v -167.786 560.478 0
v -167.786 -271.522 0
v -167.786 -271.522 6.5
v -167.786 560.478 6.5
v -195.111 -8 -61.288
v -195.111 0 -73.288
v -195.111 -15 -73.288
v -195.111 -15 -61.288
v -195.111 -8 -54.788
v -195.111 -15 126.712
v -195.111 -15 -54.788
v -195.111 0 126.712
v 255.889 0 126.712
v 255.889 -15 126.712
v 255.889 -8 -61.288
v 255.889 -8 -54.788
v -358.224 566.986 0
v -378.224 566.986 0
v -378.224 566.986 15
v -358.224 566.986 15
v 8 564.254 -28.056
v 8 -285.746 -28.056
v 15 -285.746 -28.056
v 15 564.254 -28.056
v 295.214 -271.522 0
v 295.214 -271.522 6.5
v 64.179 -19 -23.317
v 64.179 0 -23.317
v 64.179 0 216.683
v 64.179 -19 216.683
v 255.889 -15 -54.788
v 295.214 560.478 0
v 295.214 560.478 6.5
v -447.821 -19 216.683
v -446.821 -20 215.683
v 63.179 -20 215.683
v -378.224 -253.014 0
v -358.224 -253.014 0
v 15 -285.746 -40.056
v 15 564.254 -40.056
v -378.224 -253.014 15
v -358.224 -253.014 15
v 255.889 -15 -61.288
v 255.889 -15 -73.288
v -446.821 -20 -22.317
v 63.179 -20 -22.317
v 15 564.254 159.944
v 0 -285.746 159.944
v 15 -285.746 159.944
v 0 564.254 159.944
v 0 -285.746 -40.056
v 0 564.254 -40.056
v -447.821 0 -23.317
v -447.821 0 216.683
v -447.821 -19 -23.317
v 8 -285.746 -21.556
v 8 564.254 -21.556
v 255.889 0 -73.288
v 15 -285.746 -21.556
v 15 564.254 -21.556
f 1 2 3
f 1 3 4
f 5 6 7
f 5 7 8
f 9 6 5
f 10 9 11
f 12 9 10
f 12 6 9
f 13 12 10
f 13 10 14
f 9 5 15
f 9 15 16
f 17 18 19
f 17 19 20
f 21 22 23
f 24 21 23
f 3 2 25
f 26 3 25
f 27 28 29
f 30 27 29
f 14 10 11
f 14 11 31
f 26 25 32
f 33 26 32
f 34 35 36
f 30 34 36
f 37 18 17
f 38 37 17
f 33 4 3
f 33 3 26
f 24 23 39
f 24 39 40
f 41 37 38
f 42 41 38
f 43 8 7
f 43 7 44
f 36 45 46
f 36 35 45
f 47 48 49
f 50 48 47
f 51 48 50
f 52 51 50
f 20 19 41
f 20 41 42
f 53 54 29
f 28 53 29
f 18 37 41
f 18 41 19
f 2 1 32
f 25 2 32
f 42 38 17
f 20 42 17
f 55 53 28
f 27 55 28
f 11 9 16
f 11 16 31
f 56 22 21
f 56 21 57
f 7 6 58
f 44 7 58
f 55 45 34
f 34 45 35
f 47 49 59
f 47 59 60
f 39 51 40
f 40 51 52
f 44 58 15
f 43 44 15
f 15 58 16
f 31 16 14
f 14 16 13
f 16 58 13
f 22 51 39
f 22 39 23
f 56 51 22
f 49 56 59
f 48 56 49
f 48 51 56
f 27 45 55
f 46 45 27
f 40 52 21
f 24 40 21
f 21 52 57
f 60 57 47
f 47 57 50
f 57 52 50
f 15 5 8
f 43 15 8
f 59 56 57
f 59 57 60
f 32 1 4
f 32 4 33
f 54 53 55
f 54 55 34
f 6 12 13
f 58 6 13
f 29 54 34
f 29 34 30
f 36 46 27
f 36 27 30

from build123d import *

# Parameters (mm, degrees)
F0_W      = 512
F0_H      = 240
F1_DEPTH  = 20
F2_SIZE   = 1
F3_W      = 850
F3_H      = 200
F4_DEPTH  = 15
F5_W      = 15
F5_H      = 6.5
F6_DEPTH  = 1000
F7_W      = 451
F7_H      = 200
F8_DEPTH  = 15
F9_W      = 17.3011739743
F9_H      = 6.5
F10_DEPTH = 1000
F11_W     = 463
F11_H     = 832
F12_DEPTH = 6.5
F13_W     = 20
F13_H     = 820
F14_DEPTH = 15


with BuildPart() as f1:
    # F0 (on Front) → F1 (new body)
    with BuildSketch(Plane.XZ):
        with Locations((-191.8205638528, 96.6834676266)):
            Rectangle(F0_W, F0_H)
    extrude(amount=F1_DEPTH)

    # F2
    f2_edges = [f1.edges().sort_by_distance(p)[0] for p in [
        (-191.820564, -20, -23.316532),
        (64.179436, -20, 96.683468),
        (-191.820564, -20, 216.683468),
        (-447.820564, -20, 96.683468),
    ]]
    chamfer(f2_edges, length=F2_SIZE)


with BuildPart() as f4:
    # F3 (on Right) → F4 (new body)
    with BuildSketch(Plane.YZ):
        with Locations((139.2540290207, 59.9439153292)):
            Rectangle(F3_W, F3_H)
    extrude(amount=F4_DEPTH)

    # F5 (on face) → F6 (cut)
    with BuildSketch(Plane.XZ.offset(285.7459709793)):
        with Locations((15.5, -24.8060846708)):
            Rectangle(F5_W, F5_H)
    extrude(amount=-F6_DEPTH, mode=Mode.SUBTRACT)


with BuildPart() as f8:
    # F7 (on Front) → F8 (new body)
    with BuildSketch(Plane.XZ):
        with Locations((30.3891174048, 26.7120815462)):
            Rectangle(F7_W, F7_H)
    extrude(amount=F8_DEPTH)

    # F9 (on face) → F10 (cut)
    with BuildSketch(Plane(origin=(-195.1108825952, 0, 0), x_dir=(0, -1, 0), z_dir=(-1, 0, 0))):
        with Locations((16.6505869871, -58.0379184538)):
            Rectangle(F9_W, F9_H)
    extrude(amount=-F10_DEPTH, mode=Mode.SUBTRACT)


with BuildPart() as f12:
    # F11 (on Top) → F12 (new body)
    with BuildSketch(Plane.XY):
        with Locations((63.7137074471, 144.4778356552)):
            Rectangle(F11_W, F11_H)
    extrude(amount=F12_DEPTH)


with BuildPart() as f14:
    # F13 (on Top) → F14 (new body)
    with BuildSketch(Plane.XY):
        with Locations((-368.2242131233, 156.9858825207)):
            Rectangle(F13_W, F13_H)
    extrude(amount=F14_DEPTH)


solid = Compound([f1.part, f4.part, f8.part, f12.part, f14.part])
